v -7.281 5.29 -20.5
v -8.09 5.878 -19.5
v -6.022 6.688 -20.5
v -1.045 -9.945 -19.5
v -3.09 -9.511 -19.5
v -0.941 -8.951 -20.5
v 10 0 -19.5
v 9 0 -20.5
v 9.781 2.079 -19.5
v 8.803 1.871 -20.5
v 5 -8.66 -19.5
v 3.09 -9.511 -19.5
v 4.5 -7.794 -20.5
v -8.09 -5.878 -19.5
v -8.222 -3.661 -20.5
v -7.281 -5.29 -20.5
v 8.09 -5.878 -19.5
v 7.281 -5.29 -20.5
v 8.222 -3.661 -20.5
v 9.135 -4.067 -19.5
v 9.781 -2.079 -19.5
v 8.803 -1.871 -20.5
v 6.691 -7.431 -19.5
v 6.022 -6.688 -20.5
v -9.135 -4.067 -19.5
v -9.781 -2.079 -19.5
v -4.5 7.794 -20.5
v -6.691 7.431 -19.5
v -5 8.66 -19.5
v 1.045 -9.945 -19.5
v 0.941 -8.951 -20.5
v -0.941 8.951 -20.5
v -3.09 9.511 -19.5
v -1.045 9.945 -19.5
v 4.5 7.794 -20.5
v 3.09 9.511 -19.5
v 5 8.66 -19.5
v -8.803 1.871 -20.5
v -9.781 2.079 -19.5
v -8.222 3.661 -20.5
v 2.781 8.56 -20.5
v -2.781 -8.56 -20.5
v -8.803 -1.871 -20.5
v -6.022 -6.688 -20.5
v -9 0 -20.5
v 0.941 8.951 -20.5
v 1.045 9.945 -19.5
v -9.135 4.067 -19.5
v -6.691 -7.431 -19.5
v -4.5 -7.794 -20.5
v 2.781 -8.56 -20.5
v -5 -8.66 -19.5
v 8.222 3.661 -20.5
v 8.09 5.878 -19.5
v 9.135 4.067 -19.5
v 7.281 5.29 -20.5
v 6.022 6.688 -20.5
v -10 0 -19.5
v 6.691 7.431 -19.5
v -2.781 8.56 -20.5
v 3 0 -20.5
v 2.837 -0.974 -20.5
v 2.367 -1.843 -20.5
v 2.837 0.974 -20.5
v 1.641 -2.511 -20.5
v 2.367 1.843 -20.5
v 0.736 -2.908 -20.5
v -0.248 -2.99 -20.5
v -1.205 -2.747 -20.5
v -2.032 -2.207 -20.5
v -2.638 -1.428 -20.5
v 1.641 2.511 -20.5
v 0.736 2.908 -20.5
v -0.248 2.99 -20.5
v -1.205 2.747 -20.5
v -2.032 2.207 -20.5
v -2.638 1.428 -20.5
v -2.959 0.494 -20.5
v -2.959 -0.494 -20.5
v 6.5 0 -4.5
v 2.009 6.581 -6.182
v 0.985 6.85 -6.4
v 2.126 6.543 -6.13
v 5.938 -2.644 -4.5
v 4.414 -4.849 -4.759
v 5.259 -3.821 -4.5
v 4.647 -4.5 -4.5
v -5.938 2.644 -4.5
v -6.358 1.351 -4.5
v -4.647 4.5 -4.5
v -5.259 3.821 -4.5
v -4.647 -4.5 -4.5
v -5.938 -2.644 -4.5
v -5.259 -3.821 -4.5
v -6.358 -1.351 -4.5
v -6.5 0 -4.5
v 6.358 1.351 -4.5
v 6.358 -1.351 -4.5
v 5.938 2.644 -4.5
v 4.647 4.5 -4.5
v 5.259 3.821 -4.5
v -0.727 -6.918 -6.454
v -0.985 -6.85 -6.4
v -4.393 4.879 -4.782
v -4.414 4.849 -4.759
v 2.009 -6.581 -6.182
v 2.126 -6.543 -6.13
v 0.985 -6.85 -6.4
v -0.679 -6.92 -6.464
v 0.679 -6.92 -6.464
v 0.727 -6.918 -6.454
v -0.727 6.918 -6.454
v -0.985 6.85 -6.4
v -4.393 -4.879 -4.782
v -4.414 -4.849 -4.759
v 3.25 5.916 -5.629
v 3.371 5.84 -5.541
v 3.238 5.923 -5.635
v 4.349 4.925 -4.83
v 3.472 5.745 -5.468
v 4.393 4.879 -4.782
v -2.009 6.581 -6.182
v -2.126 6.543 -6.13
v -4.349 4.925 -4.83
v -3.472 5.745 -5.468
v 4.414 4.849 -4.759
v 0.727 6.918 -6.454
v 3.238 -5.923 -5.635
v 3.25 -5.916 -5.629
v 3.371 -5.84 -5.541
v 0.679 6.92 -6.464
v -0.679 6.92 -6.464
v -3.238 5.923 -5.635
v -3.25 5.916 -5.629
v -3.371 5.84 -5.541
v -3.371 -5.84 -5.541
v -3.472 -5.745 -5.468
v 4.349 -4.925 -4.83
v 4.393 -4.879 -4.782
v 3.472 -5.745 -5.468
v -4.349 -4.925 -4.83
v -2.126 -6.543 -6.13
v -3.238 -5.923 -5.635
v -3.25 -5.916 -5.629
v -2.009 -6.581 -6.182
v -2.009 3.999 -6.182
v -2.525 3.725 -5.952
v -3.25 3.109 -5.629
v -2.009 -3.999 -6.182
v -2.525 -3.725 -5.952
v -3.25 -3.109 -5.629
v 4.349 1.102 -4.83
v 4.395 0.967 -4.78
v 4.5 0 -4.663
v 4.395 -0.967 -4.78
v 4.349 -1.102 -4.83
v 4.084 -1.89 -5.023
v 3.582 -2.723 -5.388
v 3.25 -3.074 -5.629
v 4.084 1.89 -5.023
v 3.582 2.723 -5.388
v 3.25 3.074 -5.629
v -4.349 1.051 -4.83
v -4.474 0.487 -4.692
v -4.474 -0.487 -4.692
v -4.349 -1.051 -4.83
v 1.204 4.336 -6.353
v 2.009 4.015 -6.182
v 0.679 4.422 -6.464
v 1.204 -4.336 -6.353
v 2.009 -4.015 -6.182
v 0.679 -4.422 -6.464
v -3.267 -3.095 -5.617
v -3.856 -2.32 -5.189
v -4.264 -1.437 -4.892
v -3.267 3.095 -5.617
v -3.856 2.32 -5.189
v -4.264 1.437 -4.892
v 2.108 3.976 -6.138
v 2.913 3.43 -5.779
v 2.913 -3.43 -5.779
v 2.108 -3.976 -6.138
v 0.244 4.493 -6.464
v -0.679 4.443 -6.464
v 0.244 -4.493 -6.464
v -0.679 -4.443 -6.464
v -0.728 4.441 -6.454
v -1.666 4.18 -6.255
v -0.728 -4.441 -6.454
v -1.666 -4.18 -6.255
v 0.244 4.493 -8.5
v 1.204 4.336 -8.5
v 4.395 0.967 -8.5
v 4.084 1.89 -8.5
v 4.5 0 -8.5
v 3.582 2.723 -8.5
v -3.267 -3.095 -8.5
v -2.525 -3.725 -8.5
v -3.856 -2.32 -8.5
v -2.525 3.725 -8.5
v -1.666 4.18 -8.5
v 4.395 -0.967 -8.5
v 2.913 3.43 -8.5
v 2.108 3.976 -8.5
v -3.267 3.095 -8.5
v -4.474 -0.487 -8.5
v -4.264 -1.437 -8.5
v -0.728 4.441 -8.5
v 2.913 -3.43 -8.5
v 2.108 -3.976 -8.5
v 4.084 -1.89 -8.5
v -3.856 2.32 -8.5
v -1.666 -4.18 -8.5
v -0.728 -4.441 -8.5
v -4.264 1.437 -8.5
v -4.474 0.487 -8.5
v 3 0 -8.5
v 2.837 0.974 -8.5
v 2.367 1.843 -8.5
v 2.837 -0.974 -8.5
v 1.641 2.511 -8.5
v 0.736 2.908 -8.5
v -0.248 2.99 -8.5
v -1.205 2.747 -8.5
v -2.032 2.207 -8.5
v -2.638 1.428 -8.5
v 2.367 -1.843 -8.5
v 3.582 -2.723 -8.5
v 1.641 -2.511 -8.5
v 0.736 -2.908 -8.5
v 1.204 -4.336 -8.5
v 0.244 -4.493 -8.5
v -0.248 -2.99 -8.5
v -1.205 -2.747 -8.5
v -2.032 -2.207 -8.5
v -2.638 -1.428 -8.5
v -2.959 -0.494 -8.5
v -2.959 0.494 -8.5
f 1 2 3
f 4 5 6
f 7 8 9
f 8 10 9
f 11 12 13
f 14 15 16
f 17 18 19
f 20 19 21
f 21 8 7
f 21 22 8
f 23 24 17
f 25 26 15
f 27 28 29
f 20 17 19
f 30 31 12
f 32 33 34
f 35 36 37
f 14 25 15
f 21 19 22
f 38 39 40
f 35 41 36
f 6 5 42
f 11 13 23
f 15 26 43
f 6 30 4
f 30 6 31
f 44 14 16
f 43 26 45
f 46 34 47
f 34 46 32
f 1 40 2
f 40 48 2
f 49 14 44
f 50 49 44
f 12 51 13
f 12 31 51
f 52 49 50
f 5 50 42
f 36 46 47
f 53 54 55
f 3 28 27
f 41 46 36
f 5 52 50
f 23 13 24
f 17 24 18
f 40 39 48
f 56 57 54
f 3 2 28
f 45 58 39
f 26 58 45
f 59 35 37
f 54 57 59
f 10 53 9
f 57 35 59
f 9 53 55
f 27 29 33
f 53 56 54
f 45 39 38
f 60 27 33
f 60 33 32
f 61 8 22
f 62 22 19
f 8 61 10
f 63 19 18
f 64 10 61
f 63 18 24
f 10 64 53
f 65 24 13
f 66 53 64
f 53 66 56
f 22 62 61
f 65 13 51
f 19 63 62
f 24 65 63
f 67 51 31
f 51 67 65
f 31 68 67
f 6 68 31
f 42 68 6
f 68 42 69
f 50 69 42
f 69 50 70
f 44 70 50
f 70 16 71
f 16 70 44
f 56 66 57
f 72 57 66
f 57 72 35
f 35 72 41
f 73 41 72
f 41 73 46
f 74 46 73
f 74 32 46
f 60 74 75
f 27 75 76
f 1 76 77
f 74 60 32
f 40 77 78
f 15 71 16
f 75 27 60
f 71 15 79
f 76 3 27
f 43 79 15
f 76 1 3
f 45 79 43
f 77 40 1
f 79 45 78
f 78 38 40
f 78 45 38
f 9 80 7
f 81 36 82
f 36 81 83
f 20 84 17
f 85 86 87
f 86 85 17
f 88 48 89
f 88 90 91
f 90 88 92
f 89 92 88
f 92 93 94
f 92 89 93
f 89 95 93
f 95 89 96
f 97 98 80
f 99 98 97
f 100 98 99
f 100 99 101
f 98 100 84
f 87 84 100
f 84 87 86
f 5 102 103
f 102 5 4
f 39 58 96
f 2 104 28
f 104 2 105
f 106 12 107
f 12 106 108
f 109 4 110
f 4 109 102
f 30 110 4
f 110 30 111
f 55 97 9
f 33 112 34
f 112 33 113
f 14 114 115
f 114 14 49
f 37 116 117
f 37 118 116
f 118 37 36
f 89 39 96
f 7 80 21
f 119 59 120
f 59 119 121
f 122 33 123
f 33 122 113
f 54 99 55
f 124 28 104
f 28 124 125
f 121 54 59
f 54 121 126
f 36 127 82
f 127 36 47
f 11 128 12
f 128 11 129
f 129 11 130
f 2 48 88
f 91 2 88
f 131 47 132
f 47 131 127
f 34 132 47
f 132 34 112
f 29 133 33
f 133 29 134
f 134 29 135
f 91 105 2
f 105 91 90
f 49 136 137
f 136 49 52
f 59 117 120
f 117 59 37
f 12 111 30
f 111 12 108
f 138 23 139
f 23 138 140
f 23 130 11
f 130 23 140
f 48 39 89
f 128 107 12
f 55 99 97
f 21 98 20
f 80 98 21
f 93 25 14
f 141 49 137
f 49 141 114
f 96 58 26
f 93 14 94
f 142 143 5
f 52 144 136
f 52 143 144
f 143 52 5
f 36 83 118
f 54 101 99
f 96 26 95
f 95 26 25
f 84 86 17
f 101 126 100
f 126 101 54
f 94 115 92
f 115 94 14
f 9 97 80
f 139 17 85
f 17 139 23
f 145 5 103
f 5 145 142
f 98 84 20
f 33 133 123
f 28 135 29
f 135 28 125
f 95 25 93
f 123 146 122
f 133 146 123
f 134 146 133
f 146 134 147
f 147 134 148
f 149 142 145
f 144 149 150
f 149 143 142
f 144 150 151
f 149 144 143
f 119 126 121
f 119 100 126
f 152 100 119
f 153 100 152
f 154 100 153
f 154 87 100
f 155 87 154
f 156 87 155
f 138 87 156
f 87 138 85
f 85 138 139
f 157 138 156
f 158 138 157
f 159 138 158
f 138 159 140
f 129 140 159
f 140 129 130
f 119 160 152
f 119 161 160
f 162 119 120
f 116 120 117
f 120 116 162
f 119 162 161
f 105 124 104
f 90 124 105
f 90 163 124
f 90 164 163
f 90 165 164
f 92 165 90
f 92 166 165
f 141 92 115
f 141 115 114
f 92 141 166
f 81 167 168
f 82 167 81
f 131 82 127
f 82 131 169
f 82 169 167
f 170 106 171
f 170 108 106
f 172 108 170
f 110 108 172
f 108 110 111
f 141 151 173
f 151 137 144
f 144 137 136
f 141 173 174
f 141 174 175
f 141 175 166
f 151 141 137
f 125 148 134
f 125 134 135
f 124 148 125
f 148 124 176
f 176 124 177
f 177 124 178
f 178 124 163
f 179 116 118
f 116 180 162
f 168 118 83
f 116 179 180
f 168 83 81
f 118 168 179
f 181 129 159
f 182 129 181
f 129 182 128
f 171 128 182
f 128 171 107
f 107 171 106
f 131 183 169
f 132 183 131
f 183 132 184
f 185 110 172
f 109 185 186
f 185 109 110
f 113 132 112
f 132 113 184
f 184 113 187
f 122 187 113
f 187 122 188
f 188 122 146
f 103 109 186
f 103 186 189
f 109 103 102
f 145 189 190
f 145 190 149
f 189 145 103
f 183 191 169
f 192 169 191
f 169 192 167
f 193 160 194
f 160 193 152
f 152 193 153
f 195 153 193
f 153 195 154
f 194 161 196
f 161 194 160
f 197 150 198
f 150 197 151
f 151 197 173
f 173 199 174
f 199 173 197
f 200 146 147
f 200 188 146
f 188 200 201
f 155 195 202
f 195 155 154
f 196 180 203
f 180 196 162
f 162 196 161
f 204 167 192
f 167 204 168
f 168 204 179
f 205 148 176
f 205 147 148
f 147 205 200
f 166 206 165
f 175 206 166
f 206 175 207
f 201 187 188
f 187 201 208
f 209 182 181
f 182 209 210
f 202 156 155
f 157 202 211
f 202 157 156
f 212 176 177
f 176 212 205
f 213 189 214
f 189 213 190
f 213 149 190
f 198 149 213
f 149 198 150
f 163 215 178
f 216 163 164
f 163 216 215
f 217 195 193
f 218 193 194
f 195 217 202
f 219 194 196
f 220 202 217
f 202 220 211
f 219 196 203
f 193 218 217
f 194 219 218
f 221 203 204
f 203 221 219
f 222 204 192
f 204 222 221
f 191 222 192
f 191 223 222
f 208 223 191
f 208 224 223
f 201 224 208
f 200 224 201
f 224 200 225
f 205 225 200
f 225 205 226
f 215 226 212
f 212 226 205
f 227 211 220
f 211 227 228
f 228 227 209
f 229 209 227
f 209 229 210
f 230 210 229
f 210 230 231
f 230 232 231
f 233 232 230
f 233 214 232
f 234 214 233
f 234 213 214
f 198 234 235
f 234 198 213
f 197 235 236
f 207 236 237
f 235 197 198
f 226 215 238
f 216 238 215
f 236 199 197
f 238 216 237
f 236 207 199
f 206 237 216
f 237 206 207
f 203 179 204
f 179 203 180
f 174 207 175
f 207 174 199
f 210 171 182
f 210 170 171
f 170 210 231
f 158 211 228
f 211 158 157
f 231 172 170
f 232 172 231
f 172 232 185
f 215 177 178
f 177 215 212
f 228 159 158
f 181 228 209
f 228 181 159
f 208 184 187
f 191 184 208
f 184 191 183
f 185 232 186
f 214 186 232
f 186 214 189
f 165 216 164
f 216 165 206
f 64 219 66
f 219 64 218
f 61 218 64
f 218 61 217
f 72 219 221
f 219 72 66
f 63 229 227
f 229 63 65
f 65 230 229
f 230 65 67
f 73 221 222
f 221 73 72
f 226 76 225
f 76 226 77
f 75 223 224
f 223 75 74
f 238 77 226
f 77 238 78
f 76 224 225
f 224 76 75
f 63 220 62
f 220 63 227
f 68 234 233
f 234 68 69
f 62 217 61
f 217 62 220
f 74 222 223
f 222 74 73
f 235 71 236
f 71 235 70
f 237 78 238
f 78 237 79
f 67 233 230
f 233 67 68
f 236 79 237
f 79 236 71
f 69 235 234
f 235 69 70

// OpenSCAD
len = 14;
braceD = 13;
$fs = 1;

rake = 1.25;
forkLen = 14;
rakeOffsetAngle = 0 * (90 - atan(forkLen/rake));

module brace() {
    rotate([90,0,0]) cylinder(d=braceD, h=50, center=true);
    cylinder(d=9, h=braceD + 4, center=true);
    cylinder(d=6, h=100, center=true);
}
rotate([0, -rakeOffsetAngle, 0]) difference() {
    rotate([0, rakeOffsetAngle, 0]) translate([0,0,-(len + braceD/2)]) {
        cylinder(d1=18, d2=20, h=1, center=false);
        translate([0,0,1]) cylinder(d1=20, d2=braceD, h=len+1, center=false);

        }
    #brace();
}

// washer
*difference() {
    translate([0,0,-28]) intersection() {
        translate([0,0,-1]) rotate([0, rakeOffsetAngle, 0]) cylinder(d=25, h=5, center=true);
        cylinder(d=25, h=3, center=false);

    }
    brace();
}
